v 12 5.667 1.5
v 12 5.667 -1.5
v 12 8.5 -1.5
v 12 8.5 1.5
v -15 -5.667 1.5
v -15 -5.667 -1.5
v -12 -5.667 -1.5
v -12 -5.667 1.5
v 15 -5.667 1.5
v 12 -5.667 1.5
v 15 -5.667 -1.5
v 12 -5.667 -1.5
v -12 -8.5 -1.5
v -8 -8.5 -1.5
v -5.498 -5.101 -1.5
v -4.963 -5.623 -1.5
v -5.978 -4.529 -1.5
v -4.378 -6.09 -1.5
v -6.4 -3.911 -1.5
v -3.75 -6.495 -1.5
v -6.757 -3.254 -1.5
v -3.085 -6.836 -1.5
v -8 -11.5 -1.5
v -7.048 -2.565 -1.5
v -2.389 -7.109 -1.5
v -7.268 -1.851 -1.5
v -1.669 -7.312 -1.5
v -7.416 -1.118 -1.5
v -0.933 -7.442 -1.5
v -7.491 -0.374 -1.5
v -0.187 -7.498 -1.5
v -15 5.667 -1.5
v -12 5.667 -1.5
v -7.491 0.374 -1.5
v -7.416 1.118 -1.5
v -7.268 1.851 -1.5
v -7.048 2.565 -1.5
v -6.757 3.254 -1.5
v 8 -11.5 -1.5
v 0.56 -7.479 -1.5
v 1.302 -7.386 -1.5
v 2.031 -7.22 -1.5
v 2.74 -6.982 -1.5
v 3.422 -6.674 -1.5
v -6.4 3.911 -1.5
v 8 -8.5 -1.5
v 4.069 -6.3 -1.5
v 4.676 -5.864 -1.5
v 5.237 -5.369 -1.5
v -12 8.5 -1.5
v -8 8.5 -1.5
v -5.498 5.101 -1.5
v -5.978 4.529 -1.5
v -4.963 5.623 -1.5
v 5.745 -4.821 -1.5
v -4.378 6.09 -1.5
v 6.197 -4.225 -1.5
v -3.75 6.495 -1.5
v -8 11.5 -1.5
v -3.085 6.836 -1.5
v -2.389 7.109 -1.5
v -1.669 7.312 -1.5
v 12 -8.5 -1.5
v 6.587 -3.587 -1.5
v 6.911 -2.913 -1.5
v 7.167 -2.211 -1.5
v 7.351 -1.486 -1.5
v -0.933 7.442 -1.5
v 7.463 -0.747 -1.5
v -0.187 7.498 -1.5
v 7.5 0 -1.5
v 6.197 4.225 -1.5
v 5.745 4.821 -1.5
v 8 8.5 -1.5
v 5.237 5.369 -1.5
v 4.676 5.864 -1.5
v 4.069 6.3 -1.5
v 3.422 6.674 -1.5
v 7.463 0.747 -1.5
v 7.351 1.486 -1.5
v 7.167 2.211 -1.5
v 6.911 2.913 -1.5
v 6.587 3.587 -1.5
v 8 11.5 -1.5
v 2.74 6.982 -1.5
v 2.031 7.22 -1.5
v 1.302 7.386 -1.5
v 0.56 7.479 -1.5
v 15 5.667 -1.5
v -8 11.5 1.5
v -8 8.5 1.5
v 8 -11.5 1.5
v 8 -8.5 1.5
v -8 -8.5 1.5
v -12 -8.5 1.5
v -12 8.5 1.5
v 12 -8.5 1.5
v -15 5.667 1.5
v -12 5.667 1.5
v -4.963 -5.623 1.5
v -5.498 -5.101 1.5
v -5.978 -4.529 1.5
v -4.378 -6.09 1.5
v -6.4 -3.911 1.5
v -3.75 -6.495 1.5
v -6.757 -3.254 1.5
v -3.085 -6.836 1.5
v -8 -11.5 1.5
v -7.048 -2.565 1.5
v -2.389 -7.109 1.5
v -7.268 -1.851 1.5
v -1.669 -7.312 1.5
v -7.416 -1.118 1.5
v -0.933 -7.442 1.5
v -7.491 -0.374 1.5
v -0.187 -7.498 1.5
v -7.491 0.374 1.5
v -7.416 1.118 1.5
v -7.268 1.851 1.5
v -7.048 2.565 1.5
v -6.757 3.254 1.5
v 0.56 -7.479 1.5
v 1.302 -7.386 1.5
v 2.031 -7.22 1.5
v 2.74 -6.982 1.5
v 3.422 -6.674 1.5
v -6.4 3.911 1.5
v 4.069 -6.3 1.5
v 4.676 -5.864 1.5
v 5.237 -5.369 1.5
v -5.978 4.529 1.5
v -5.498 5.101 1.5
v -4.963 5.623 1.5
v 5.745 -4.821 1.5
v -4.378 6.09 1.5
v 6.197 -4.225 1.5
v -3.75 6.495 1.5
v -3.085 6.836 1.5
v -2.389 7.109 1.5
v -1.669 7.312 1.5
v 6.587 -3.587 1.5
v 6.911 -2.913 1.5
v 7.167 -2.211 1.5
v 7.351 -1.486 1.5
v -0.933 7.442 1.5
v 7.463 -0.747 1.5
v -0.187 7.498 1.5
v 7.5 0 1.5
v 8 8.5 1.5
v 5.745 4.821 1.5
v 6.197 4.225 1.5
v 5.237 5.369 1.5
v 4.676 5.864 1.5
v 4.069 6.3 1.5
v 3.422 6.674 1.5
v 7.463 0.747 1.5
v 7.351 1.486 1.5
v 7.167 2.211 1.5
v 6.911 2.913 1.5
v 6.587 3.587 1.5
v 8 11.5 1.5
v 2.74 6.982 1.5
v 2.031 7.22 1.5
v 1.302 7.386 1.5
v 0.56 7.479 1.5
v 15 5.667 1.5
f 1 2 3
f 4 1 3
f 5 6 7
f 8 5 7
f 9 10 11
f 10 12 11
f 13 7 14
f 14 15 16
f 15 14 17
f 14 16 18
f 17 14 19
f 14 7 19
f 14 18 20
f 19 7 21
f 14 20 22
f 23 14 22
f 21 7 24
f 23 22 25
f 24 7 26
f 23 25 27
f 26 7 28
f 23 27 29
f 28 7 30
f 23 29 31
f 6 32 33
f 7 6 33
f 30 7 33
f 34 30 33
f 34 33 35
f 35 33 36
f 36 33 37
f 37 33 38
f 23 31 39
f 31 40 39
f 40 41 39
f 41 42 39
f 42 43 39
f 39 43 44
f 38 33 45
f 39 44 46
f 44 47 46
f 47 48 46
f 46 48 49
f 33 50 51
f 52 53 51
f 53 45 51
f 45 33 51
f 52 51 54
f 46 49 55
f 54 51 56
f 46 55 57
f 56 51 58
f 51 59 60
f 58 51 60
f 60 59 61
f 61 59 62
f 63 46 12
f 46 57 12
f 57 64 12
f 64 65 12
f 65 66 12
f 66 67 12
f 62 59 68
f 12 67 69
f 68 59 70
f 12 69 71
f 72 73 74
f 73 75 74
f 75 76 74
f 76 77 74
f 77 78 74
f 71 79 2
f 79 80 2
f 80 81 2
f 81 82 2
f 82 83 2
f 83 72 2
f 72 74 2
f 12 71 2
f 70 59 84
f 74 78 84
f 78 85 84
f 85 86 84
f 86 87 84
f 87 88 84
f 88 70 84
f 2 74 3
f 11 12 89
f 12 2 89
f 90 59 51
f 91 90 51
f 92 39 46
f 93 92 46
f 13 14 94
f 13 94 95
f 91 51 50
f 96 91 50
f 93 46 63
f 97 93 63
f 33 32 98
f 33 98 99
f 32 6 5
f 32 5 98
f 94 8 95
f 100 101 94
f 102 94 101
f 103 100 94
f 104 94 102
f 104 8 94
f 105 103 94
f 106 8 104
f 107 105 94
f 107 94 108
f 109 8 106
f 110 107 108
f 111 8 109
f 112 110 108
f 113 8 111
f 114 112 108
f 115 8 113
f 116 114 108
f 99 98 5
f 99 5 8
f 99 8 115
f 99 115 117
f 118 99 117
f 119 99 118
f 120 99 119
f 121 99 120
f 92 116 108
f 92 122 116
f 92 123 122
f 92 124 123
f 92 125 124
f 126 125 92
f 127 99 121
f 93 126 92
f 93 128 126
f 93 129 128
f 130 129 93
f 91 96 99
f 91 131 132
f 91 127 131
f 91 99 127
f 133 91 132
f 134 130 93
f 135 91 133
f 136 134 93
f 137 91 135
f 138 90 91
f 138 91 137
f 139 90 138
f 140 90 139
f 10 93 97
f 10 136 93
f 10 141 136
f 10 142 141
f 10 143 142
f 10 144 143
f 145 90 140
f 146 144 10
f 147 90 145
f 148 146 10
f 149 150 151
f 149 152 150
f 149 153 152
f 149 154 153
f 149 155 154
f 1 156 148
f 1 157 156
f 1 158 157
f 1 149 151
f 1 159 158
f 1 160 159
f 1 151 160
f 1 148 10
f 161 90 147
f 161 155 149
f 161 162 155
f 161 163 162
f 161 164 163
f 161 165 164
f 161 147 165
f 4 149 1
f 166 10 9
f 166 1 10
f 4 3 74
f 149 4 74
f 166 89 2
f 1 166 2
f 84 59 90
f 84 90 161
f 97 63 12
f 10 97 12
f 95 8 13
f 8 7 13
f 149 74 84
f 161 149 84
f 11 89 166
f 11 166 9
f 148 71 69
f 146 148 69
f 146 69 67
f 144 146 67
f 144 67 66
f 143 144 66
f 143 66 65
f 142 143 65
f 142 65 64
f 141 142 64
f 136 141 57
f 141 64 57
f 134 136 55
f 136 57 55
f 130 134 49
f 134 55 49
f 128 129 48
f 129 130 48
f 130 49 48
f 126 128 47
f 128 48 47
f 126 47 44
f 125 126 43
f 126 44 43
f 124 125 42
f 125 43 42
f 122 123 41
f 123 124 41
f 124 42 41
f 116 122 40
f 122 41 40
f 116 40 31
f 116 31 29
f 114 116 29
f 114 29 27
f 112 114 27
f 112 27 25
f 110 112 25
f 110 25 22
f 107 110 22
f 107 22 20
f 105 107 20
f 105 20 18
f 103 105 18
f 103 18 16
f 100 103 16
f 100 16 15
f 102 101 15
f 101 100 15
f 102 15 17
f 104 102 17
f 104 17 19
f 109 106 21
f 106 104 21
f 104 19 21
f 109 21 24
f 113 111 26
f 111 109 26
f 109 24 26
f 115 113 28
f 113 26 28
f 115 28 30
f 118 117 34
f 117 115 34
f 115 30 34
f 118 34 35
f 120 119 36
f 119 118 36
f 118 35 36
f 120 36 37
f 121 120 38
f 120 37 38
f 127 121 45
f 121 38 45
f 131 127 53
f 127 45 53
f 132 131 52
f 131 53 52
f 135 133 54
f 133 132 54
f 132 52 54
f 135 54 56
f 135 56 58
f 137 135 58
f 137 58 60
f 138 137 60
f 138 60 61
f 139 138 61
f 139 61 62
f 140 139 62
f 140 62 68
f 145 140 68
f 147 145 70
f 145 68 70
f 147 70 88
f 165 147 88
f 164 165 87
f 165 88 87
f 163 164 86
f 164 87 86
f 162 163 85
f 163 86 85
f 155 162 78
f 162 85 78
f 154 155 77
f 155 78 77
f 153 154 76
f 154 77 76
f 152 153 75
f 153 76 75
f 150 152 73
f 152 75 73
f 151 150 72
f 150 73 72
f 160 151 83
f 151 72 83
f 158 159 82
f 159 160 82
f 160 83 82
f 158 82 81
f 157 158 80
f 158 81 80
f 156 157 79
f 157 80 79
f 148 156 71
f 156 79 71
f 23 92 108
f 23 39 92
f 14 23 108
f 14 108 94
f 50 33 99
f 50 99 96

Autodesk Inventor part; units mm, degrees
ref_plane "YZ Plane" through (0, 0, 0) normal (1, 0, 0) x (0, 1, 0)
ref_plane "XZ Plane" through (0, 0, 0) normal (0, 1, 0) x (-1, 0, 0)
ref_plane "XY Plane" through (0, 0, 0) normal (0, 0, 1) x (1, 0, 0)
sketch "Sketch1" plane through (0, 0, 0) normal (0, 0, 1) x (1, 0, 0)
  circle A0 centre (0, 0) radius 7.5
  line L0 (15, 5.6667) -> (12, 5.6667)
  line L1 (12, 5.6667) -> (12, 8.5)
  line L2 (12, -8.5) -> (12, -5.6667)
  line L3 (12, -5.6667) -> (15, -5.6667)
  line L4 (-8, -11.5) -> (-8, -8.5)
  line L5 (-8, -8.5) -> (-12, -8.5)
  line L6 (8, -11.5) -> (8, -8.5)
  line L7 (8, -8.5) -> (12, -8.5)
  line L8 (-15, -5.6667) -> (-12, -5.6667)
  line L9 (-12, -5.6667) -> (-12, -8.5)
  line L10 (-15, 5.6667) -> (-12, 5.6667)
  line L11 (-12, 5.6667) -> (-12, 8.5)
  line L12 (-8, 11.5) -> (-8, 8.5)
  line L13 (-8, 8.5) -> (-12, 8.5)
  line L14 (12, 8.5) -> (8, 8.5)
  line L15 (8, 8.5) -> (8, 11.5)
  line L16 (15, 5.6667) -> (15, -5.6667)
  line L17 (-8, 11.5) -> (8, 11.5)
  line L18 (-15, -5.6667) -> (-15, 5.6667)
  line L19 (8, -11.5) -> (-8, -11.5)
  line L20 (15, -5.1667) -> (15, 5.6667)
  line L21 (-20.9424, 0) -> (31.3224, 0) construction
  line L22 (0, 36) -> (0, -23) construction
  dimension "d0" = 15
  dimension "d3" = 3
  dimension "d5" = 3
  dimension "d6" = 3
  dimension "d16" = 3
  dimension "d18" = 24
  dimension "d19" = 16
  dimension "d21" = 17
  dimension "d22" = 11.3333
extrude "Extrusion1" add sketch "Sketch1" along normal mid plane 3
equation "\"d19\" = 0.666667 * d18"
equation "\"d22\" = 0.666667 * d21"
properties part number "Camera-Holder_Bearing-Ring-Middle-Right"
